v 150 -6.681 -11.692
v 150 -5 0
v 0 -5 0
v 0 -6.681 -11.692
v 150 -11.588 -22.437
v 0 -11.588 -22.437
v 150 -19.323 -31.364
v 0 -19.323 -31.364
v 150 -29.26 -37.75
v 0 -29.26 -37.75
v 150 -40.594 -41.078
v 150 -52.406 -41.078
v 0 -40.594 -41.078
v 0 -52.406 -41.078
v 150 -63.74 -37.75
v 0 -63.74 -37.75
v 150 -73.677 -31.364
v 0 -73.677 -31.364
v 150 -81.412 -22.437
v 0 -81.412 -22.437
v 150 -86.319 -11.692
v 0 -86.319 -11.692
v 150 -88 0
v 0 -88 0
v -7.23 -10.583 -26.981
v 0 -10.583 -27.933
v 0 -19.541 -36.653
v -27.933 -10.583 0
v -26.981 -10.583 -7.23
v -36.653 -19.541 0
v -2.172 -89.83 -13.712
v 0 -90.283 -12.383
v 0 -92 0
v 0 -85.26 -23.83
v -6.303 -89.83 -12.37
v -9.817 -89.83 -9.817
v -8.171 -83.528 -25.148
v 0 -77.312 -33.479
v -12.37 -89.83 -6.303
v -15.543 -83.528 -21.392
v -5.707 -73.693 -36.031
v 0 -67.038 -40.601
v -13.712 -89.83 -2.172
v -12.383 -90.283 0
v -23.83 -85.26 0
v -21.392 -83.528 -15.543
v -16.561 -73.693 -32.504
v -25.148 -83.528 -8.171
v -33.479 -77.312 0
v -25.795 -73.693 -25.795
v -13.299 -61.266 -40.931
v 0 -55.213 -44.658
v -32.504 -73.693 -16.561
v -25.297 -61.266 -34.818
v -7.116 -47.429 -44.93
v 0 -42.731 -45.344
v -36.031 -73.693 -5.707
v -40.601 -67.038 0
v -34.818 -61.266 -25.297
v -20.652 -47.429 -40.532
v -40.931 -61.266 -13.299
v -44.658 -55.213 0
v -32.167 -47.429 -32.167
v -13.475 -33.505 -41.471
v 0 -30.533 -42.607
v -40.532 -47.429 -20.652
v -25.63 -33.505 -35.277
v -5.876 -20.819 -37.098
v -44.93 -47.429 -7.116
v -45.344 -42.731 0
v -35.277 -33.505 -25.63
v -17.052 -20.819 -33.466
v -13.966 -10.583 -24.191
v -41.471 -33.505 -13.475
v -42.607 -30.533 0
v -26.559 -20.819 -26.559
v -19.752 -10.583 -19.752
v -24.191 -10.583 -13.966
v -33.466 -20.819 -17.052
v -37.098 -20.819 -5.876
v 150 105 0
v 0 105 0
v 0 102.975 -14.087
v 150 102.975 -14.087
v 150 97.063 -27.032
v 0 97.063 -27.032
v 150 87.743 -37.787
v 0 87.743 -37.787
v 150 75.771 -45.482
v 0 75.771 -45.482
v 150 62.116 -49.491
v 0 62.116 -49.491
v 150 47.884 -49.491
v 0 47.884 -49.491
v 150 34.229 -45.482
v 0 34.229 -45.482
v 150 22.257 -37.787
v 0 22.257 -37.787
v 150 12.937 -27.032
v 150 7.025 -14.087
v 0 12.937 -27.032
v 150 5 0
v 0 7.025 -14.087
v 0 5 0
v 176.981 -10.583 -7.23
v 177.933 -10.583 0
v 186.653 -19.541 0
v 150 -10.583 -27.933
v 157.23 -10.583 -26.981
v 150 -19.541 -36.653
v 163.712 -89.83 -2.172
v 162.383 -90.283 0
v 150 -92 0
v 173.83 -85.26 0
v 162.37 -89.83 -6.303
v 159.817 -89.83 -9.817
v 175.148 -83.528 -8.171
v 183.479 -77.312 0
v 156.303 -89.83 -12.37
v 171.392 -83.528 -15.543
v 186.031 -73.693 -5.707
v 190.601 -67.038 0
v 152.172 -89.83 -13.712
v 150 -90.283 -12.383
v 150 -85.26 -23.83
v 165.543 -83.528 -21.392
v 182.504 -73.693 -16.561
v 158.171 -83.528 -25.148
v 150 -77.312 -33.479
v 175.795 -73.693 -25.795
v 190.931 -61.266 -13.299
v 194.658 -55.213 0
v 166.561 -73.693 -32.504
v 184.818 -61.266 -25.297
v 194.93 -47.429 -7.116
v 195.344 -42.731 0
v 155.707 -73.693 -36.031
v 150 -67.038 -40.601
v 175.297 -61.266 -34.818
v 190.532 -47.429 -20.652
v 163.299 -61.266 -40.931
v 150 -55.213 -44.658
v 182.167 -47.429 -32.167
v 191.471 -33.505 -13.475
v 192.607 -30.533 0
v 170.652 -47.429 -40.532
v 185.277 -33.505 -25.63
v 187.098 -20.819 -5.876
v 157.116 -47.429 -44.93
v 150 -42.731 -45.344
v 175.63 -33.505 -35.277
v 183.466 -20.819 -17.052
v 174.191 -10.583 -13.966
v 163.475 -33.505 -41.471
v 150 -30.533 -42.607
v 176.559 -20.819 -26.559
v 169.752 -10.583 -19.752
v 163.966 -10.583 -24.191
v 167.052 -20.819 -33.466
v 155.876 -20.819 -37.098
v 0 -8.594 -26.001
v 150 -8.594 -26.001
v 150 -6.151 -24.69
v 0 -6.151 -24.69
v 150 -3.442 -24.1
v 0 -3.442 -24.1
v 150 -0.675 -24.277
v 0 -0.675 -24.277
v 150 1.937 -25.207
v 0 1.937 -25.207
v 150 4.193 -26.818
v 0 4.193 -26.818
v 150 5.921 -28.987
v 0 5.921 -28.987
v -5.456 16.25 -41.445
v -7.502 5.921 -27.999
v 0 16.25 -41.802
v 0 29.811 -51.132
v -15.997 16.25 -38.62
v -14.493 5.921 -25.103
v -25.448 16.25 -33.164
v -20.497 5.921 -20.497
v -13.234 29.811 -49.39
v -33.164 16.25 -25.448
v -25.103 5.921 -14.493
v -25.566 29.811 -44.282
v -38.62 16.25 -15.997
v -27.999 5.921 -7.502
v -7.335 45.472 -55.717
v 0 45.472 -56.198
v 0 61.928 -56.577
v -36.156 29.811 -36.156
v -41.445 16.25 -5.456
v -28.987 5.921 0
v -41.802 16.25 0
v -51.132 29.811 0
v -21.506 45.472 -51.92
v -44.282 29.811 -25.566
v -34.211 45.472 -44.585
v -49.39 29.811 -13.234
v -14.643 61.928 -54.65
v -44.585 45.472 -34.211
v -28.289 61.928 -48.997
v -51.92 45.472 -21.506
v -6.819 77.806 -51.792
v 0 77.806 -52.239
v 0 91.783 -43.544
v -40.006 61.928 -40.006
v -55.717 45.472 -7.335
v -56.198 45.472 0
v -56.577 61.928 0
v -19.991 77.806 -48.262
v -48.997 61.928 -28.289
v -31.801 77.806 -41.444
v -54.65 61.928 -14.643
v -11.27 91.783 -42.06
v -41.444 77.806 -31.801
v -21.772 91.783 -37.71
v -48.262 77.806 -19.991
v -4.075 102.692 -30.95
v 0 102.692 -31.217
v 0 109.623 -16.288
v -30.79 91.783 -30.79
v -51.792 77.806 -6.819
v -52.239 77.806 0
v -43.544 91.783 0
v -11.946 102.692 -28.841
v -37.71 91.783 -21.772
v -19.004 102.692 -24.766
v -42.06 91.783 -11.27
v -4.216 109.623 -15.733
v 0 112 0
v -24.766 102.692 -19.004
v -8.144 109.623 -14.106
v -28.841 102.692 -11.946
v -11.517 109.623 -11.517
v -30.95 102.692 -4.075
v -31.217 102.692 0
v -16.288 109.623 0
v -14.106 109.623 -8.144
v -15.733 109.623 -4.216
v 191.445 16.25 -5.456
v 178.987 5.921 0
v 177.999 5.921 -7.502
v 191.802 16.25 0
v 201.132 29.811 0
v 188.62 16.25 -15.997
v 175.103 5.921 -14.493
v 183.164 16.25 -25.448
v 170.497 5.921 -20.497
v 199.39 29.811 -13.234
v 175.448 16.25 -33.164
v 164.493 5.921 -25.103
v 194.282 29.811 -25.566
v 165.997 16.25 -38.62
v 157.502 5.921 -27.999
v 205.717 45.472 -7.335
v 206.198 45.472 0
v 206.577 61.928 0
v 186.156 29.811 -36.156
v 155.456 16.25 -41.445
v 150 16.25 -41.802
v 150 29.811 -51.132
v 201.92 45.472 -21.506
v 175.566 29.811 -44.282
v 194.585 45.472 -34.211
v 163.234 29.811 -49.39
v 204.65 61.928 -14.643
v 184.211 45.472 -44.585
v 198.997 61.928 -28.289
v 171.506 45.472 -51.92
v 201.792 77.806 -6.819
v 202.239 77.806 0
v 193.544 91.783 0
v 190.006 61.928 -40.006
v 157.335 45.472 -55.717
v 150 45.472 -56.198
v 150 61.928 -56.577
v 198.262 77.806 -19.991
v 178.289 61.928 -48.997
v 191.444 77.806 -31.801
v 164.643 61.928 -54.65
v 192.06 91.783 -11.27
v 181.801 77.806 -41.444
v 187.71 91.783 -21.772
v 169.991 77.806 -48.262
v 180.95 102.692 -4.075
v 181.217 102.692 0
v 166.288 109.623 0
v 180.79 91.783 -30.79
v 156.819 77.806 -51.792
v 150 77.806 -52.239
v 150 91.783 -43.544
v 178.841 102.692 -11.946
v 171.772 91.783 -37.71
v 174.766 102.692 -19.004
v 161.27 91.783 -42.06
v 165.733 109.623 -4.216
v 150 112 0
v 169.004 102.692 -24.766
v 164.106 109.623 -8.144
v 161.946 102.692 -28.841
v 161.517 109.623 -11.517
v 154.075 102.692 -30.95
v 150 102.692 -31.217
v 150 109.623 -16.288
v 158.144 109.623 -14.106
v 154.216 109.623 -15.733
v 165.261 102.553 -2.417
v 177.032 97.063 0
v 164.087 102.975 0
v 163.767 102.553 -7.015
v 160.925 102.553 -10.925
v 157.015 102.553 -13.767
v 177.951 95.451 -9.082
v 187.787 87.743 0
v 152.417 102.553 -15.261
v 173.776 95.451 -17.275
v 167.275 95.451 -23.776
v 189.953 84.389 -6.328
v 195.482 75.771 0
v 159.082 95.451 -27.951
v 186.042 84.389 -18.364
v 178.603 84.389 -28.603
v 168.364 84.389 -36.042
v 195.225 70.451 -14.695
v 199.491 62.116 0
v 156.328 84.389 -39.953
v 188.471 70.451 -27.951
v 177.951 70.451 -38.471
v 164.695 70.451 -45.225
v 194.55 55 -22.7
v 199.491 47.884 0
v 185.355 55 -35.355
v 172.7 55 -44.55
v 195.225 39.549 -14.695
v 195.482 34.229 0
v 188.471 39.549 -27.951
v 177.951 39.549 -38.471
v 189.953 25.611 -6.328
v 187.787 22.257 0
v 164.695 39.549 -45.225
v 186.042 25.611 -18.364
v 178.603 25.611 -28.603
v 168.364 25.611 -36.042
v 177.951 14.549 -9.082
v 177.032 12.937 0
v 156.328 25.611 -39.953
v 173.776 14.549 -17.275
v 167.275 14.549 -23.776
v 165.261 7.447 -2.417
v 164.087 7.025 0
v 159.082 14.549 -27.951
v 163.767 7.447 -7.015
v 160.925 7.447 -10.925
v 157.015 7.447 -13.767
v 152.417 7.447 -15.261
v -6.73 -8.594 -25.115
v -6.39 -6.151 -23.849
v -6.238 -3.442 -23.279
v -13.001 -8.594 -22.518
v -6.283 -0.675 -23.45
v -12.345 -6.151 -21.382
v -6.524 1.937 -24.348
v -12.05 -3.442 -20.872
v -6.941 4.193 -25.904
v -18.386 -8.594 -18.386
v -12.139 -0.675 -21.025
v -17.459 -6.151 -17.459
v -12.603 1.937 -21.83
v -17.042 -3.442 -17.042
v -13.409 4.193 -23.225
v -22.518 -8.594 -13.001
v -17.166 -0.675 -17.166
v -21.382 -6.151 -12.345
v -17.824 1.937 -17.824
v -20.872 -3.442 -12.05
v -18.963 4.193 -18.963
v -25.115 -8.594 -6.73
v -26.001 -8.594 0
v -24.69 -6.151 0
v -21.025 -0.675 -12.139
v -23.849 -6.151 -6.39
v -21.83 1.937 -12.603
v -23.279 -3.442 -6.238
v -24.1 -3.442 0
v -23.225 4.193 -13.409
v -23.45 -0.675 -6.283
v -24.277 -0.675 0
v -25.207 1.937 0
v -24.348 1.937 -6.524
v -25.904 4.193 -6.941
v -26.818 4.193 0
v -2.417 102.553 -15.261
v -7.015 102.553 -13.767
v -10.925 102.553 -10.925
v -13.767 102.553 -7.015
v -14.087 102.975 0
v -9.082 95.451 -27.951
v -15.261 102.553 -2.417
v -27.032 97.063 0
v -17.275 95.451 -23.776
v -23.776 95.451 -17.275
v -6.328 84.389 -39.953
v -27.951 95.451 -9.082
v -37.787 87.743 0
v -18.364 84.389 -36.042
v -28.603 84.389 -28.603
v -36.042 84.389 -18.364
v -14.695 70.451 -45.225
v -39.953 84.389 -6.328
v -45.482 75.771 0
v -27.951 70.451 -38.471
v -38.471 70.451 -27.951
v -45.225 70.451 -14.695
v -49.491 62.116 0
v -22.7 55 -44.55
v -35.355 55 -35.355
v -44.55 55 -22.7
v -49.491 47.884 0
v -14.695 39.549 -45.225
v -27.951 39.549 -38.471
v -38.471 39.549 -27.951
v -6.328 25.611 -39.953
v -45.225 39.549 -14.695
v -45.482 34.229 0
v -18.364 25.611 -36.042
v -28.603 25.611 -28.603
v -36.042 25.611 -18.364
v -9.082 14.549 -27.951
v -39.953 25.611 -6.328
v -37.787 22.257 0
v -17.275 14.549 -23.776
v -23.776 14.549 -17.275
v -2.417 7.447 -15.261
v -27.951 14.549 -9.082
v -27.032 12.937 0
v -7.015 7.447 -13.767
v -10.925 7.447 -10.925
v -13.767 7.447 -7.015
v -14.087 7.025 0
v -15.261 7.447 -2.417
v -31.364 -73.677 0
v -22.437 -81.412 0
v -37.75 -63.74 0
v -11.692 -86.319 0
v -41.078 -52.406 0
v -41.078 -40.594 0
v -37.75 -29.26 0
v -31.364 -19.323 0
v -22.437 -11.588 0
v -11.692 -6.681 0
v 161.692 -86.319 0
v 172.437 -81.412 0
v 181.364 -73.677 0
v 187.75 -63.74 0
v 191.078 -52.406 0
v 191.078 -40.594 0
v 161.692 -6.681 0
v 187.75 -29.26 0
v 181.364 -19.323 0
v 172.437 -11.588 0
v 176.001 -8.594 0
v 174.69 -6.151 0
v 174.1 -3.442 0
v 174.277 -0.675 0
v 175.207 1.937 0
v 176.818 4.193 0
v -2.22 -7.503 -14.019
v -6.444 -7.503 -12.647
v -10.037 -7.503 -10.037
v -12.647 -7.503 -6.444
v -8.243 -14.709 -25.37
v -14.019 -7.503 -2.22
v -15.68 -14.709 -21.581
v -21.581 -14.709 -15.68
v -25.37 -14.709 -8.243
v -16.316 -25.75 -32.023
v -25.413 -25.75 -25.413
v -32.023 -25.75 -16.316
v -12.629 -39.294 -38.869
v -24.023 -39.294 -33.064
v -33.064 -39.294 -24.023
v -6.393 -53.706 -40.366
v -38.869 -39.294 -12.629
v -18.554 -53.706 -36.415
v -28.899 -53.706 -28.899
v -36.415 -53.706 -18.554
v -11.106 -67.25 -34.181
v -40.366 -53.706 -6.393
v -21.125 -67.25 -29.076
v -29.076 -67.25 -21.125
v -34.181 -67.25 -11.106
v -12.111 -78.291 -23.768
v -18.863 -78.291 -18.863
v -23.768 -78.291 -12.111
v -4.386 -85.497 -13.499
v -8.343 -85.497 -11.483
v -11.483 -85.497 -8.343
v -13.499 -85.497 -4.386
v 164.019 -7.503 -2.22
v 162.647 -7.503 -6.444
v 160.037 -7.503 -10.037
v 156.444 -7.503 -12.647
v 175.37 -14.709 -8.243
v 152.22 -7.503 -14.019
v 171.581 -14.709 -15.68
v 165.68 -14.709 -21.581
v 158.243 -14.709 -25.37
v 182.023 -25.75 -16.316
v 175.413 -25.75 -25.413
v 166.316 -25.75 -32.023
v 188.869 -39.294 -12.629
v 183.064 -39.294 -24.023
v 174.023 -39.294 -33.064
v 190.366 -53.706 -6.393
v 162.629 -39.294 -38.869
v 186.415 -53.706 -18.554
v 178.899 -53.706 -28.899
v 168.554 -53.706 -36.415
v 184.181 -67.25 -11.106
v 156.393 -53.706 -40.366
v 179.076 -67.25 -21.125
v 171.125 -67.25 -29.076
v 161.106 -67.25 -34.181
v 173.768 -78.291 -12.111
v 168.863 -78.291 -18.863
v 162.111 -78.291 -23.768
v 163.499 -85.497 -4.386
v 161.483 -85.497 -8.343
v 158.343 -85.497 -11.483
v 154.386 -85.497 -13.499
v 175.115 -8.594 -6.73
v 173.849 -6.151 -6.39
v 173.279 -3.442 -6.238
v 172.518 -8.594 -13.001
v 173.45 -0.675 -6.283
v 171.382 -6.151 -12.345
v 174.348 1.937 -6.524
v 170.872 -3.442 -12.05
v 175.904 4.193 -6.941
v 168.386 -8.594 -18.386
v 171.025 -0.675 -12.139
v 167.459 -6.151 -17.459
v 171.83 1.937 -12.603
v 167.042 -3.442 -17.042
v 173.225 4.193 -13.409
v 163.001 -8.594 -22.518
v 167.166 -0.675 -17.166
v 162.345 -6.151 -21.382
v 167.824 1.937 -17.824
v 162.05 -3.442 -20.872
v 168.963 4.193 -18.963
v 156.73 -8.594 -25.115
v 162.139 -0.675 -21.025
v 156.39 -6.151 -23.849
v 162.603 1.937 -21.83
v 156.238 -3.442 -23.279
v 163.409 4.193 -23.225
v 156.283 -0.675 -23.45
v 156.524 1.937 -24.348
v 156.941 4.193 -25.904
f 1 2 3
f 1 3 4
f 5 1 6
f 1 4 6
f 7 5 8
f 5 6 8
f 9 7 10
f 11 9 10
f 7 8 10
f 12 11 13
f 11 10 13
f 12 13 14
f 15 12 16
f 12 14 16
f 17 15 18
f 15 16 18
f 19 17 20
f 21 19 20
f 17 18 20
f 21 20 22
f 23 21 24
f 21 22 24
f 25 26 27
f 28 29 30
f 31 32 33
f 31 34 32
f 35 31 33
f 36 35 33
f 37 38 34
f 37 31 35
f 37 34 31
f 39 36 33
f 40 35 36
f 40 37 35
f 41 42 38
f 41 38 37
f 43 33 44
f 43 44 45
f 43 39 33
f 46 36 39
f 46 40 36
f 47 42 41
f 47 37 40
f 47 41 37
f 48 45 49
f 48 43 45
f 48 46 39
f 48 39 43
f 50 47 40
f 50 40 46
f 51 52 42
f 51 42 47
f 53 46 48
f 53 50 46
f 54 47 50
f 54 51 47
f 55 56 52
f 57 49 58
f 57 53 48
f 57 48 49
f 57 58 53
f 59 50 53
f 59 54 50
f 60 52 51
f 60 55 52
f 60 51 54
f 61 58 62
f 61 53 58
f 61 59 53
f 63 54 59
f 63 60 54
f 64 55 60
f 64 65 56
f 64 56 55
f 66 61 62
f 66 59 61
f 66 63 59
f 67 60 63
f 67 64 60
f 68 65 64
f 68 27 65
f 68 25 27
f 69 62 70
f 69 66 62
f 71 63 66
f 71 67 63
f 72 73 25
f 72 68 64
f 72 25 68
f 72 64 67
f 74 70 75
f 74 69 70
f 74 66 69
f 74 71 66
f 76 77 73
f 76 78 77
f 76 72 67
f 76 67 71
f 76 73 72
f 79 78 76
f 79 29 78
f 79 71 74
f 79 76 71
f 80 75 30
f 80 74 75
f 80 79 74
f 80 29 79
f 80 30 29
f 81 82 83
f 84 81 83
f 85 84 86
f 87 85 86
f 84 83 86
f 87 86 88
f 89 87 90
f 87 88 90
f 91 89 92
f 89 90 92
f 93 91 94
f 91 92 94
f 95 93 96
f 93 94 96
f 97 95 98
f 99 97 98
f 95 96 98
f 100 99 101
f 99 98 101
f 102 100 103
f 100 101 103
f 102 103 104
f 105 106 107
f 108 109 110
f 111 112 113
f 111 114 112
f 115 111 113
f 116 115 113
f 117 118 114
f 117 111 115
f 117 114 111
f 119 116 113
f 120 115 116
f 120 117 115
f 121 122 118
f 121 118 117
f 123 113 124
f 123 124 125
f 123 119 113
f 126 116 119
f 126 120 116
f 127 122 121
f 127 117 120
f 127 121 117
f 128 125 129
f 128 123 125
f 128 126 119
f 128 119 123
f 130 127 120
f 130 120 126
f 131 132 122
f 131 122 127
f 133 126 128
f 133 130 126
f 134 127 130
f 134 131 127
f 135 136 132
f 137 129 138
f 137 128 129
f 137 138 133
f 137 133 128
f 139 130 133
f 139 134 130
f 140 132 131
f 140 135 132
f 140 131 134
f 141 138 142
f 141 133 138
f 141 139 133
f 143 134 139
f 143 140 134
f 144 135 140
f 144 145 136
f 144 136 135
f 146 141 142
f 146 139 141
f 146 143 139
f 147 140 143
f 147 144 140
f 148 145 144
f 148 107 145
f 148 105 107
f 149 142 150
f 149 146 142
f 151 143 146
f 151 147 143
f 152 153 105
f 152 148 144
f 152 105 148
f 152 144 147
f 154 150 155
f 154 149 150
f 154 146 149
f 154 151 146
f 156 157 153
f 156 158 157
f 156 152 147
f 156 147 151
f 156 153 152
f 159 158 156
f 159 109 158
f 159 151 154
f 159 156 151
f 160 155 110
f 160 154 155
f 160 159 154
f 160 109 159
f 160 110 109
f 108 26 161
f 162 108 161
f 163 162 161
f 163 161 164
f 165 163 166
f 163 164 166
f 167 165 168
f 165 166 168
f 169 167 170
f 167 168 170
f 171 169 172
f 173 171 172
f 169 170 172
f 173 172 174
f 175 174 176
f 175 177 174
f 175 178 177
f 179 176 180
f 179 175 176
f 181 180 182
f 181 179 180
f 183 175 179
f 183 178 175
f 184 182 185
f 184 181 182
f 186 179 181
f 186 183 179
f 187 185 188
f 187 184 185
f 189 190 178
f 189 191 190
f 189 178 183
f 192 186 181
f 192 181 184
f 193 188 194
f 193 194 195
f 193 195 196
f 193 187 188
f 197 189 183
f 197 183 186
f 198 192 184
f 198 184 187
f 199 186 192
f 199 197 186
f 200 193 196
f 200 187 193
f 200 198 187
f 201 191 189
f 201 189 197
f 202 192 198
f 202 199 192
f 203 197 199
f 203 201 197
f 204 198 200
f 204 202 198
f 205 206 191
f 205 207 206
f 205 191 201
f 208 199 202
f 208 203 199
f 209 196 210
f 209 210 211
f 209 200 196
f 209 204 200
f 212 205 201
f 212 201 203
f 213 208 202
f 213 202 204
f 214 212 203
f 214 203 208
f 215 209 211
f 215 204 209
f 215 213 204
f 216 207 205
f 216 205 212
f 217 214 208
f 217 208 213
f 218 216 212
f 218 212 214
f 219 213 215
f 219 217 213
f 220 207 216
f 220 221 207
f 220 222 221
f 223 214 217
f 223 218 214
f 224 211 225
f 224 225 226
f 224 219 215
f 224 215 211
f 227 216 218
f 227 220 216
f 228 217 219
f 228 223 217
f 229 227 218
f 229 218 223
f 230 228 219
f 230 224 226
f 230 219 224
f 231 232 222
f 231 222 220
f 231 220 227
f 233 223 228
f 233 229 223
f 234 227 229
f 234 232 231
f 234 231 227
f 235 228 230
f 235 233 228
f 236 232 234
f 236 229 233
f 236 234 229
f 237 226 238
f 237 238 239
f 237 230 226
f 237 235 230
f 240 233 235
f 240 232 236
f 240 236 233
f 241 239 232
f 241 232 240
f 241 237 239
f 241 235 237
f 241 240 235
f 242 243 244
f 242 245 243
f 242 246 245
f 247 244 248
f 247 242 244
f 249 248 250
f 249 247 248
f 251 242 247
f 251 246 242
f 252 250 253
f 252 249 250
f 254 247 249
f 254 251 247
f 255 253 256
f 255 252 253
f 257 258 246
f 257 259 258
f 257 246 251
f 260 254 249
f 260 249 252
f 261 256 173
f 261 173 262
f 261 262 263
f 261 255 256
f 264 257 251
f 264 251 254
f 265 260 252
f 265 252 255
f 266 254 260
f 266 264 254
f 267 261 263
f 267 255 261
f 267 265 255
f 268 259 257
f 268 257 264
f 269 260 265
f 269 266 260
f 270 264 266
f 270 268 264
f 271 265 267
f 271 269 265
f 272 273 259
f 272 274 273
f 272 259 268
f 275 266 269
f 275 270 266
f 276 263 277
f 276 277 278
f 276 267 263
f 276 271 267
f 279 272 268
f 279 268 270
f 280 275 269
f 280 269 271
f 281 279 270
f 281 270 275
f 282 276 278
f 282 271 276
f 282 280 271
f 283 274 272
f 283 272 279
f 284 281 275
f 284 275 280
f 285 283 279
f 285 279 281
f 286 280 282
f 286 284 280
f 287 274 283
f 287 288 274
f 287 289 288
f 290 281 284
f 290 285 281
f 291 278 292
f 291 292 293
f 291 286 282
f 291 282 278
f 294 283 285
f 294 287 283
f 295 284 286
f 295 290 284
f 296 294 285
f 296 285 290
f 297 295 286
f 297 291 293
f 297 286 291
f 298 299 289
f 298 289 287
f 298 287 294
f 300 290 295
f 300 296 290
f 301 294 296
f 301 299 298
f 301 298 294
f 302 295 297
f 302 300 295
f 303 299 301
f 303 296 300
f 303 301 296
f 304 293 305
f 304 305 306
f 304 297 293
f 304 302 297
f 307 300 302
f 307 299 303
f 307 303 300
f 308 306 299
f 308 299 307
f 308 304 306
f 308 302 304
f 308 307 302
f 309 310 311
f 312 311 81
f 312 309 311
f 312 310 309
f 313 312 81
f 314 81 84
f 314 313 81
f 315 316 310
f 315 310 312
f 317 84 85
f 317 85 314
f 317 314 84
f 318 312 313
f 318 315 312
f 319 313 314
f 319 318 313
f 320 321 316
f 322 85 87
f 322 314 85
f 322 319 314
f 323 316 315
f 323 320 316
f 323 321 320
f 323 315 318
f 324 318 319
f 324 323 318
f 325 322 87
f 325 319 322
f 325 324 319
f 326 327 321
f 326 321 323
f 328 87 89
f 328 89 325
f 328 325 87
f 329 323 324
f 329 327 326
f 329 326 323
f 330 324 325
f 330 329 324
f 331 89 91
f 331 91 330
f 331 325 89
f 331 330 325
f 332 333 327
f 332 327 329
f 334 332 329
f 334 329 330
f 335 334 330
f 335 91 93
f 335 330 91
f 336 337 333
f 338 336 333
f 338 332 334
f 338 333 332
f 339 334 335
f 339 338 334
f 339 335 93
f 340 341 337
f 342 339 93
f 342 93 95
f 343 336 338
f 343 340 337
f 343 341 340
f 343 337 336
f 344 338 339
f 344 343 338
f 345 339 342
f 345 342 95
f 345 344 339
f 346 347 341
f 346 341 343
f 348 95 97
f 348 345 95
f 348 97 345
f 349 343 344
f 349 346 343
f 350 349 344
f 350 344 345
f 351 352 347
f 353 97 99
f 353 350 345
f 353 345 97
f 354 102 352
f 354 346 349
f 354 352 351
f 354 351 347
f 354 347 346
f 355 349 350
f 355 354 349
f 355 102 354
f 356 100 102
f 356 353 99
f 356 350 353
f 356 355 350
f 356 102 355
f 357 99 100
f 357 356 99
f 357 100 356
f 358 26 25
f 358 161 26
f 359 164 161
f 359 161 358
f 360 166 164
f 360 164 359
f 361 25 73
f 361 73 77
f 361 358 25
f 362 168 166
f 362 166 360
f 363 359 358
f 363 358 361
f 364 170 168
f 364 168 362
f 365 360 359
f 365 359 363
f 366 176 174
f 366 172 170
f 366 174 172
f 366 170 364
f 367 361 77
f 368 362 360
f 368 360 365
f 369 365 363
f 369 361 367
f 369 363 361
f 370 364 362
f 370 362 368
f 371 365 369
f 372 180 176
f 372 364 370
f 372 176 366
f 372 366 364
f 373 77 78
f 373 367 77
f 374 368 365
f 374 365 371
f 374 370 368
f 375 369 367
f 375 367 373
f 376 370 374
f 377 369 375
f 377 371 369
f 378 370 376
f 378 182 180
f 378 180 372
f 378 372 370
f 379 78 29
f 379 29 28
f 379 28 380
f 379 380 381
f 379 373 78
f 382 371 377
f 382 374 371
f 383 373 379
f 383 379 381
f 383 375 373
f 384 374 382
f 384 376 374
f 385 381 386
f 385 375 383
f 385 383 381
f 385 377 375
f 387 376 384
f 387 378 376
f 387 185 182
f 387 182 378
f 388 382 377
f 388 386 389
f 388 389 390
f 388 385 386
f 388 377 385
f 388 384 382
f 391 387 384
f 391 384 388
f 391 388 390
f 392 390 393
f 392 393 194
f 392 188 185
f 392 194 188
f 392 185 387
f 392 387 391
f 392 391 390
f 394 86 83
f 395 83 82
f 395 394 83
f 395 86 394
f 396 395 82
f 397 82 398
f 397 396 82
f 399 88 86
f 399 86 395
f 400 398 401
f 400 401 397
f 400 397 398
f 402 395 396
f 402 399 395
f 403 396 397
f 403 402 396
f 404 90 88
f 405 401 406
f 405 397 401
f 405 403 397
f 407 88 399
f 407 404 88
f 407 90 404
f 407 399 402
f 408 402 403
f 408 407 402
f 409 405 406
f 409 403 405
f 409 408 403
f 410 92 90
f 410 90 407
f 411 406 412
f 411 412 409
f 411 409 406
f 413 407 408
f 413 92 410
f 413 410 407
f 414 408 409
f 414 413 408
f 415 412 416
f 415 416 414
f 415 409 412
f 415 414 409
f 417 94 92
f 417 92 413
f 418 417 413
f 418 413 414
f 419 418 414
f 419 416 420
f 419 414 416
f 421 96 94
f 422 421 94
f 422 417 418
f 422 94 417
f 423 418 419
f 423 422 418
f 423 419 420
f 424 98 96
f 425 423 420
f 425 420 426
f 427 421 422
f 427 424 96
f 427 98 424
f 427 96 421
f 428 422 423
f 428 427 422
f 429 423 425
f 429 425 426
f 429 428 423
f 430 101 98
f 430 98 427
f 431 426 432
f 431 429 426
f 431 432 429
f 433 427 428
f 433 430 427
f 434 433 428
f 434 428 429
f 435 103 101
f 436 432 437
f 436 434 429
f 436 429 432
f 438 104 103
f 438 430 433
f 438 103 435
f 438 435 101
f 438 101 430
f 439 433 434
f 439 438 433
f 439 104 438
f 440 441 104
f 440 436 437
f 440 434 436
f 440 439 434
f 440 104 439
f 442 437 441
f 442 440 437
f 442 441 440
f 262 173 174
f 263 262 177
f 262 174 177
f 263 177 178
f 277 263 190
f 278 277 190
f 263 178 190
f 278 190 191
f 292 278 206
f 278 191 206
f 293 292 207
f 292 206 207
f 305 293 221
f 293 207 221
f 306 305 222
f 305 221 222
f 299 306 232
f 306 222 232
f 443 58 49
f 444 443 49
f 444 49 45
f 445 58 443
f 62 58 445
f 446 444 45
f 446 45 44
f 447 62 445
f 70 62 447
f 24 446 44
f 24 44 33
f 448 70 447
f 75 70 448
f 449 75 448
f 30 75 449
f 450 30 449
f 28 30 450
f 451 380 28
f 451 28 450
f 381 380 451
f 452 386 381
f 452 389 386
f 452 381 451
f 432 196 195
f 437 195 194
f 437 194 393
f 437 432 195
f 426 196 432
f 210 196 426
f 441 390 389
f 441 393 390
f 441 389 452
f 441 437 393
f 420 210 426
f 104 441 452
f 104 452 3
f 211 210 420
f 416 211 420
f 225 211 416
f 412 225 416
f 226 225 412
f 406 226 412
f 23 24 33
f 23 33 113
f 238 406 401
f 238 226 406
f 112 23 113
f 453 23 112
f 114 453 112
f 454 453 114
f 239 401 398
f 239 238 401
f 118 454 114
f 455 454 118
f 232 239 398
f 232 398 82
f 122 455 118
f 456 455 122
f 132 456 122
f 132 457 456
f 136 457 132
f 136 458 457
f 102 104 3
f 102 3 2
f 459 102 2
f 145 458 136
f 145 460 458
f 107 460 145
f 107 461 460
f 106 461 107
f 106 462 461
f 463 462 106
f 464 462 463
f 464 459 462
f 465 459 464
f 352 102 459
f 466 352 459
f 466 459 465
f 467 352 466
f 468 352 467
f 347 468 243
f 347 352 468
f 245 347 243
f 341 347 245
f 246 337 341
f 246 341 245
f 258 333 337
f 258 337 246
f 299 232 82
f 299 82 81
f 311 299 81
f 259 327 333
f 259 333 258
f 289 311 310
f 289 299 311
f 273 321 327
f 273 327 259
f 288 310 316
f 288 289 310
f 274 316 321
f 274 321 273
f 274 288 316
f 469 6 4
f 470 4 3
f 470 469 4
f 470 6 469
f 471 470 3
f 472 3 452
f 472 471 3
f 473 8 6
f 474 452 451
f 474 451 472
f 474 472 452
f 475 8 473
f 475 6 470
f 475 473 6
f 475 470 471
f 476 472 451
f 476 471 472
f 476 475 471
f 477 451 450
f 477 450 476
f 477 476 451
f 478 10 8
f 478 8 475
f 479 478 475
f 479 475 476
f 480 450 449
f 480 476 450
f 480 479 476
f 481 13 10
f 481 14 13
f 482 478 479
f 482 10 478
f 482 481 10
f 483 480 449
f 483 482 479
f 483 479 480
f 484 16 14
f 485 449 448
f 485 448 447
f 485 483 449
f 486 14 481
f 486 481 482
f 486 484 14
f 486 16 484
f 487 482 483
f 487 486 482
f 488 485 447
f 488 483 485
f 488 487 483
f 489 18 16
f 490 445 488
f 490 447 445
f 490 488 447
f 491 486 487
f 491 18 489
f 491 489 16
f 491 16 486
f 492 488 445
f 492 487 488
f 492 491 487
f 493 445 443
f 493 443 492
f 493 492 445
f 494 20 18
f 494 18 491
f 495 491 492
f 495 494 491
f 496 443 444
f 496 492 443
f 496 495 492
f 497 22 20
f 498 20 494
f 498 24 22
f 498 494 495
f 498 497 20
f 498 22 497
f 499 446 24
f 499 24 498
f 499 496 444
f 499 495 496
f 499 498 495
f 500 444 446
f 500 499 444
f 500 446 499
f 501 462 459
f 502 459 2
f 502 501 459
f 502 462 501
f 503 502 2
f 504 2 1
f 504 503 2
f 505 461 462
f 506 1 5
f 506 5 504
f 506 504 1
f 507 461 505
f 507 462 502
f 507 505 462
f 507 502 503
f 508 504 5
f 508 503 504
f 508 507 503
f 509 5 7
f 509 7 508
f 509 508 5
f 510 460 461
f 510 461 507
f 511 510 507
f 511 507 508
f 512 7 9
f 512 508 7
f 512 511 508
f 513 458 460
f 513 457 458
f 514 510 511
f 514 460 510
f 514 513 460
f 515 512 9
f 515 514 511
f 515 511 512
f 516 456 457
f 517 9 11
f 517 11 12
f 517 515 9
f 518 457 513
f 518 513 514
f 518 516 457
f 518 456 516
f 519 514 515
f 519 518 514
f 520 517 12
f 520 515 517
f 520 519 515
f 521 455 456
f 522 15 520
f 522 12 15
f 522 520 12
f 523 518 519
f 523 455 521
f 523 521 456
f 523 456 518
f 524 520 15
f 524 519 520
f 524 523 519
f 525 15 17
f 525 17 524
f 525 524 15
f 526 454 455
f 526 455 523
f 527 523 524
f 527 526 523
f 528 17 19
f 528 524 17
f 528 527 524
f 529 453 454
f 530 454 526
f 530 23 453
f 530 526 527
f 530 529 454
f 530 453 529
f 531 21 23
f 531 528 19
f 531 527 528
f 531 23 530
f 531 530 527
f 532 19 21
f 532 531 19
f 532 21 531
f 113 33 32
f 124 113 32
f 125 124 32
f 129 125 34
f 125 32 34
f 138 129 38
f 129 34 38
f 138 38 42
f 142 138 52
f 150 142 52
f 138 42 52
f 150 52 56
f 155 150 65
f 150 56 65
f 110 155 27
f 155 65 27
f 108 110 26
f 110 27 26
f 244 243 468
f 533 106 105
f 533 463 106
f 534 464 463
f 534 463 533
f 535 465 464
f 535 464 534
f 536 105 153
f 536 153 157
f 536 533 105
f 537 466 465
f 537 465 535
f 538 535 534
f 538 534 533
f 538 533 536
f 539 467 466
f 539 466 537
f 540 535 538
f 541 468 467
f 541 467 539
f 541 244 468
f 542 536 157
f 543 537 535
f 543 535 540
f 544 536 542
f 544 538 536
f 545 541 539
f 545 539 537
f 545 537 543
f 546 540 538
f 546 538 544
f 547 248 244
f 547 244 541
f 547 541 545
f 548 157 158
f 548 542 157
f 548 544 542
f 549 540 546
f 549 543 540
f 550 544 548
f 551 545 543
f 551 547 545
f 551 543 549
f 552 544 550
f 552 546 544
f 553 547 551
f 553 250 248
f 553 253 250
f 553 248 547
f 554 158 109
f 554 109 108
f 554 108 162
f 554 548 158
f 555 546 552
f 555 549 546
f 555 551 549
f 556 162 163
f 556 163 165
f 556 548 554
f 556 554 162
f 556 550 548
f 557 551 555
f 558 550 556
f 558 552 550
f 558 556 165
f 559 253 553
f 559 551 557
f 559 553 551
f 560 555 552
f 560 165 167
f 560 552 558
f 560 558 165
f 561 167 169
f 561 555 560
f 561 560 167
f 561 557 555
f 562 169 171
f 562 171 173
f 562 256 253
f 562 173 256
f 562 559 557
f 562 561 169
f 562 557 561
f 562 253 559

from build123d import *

# Parameters (mm, degrees)
BOSS_EXTRUDE1_DEPTH = 150
REVOLVE1_ANGLE      = 90
MIRROR1_ANGLE       = 90


# Read off the part's stored shape, not the designer's step: Mirror1
with BuildPart() as part:
    # Sketch2 → Boss-Extrude1 (new body)
    with BuildSketch(Plane(origin=(0, 0, 0), x_dir=(0, 0, -1), z_dir=(1, 0, 0))):
        with BuildLine():
            Line((0, 5), (0, -5))
            ThreePointArc((0, -5), (41.5, -46.5), (0, -88))
            Line((0, -88), (0, -92))
            ThreePointArc((0, -92), (43.037511543, -61.265588379), (27.932931003, -10.583410997))
            ThreePointArc((27.932931003, -10.583410997), (24.092356291, -2.052490679), (28.986658103, 5.920741122))
            ThreePointArc((28.986658103, 5.920741122), (54.98416934, 70.024683756), (0, 112))
            Line((0, 112), (0, 105))
            ThreePointArc((0, 105), (50, 55), (0, 5))
        make_face()
    extrude(amount=BOSS_EXTRUDE1_DEPTH)

    # Sketch2<2> → Revolve1 (revolve)
    with BuildSketch(Plane(origin=(0, 0, 0), x_dir=(0, 0, -1), z_dir=(1, 0, 0))):
        with BuildLine():
            Line((0, 5), (0, -5))
            ThreePointArc((0, -5), (41.5, -46.5), (0, -88))
            Line((0, -88), (0, -92))
            ThreePointArc((0, -92), (43.037511543, -61.265588379), (27.932931003, -10.583410997))
            ThreePointArc((27.932931003, -10.583410997), (24.092356291, -2.052490679), (28.986658103, 5.920741122))
            ThreePointArc((28.986658103, 5.920741122), (54.98416934, 70.024683756), (0, 112))
            Line((0, 112), (0, 105))
            ThreePointArc((0, 105), (50, 55), (0, 5))
        make_face()
    revolve(axis=Axis((0, 105, 0), (0, 1, 0)), revolution_arc=REVOLVE1_ANGLE)

    # Mirror1 outline → Mirror1 (revolve)
    with BuildSketch(Plane(origin=(150, 0, 0), x_dir=(1, 0, 0), z_dir=(0, 0, 1))):
        with BuildLine():
            ThreePointArc((28.986658103, 5.920741122), (54.98416934, 70.024683756), (0, 112))
            Line((0, 112), (0, 105))
            ThreePointArc((0, 105), (50, 55), (0, 5))
            Line((0, 5), (0, -5))
            ThreePointArc((0, -5), (41.5, -46.5), (0, -88))
            Line((0, -88), (0, -92))
            ThreePointArc((0, -92), (43.037511543, -61.265588379), (27.932931003, -10.583410997))
            ThreePointArc((27.932931003, -10.583410997), (24.092356291, -2.052490679), (28.986658103, 5.920741122))
        make_face()
    revolve(axis=Axis((150, 0, 0), (0, 1, 0)), revolution_arc=MIRROR1_ANGLE)


solid = part.part
